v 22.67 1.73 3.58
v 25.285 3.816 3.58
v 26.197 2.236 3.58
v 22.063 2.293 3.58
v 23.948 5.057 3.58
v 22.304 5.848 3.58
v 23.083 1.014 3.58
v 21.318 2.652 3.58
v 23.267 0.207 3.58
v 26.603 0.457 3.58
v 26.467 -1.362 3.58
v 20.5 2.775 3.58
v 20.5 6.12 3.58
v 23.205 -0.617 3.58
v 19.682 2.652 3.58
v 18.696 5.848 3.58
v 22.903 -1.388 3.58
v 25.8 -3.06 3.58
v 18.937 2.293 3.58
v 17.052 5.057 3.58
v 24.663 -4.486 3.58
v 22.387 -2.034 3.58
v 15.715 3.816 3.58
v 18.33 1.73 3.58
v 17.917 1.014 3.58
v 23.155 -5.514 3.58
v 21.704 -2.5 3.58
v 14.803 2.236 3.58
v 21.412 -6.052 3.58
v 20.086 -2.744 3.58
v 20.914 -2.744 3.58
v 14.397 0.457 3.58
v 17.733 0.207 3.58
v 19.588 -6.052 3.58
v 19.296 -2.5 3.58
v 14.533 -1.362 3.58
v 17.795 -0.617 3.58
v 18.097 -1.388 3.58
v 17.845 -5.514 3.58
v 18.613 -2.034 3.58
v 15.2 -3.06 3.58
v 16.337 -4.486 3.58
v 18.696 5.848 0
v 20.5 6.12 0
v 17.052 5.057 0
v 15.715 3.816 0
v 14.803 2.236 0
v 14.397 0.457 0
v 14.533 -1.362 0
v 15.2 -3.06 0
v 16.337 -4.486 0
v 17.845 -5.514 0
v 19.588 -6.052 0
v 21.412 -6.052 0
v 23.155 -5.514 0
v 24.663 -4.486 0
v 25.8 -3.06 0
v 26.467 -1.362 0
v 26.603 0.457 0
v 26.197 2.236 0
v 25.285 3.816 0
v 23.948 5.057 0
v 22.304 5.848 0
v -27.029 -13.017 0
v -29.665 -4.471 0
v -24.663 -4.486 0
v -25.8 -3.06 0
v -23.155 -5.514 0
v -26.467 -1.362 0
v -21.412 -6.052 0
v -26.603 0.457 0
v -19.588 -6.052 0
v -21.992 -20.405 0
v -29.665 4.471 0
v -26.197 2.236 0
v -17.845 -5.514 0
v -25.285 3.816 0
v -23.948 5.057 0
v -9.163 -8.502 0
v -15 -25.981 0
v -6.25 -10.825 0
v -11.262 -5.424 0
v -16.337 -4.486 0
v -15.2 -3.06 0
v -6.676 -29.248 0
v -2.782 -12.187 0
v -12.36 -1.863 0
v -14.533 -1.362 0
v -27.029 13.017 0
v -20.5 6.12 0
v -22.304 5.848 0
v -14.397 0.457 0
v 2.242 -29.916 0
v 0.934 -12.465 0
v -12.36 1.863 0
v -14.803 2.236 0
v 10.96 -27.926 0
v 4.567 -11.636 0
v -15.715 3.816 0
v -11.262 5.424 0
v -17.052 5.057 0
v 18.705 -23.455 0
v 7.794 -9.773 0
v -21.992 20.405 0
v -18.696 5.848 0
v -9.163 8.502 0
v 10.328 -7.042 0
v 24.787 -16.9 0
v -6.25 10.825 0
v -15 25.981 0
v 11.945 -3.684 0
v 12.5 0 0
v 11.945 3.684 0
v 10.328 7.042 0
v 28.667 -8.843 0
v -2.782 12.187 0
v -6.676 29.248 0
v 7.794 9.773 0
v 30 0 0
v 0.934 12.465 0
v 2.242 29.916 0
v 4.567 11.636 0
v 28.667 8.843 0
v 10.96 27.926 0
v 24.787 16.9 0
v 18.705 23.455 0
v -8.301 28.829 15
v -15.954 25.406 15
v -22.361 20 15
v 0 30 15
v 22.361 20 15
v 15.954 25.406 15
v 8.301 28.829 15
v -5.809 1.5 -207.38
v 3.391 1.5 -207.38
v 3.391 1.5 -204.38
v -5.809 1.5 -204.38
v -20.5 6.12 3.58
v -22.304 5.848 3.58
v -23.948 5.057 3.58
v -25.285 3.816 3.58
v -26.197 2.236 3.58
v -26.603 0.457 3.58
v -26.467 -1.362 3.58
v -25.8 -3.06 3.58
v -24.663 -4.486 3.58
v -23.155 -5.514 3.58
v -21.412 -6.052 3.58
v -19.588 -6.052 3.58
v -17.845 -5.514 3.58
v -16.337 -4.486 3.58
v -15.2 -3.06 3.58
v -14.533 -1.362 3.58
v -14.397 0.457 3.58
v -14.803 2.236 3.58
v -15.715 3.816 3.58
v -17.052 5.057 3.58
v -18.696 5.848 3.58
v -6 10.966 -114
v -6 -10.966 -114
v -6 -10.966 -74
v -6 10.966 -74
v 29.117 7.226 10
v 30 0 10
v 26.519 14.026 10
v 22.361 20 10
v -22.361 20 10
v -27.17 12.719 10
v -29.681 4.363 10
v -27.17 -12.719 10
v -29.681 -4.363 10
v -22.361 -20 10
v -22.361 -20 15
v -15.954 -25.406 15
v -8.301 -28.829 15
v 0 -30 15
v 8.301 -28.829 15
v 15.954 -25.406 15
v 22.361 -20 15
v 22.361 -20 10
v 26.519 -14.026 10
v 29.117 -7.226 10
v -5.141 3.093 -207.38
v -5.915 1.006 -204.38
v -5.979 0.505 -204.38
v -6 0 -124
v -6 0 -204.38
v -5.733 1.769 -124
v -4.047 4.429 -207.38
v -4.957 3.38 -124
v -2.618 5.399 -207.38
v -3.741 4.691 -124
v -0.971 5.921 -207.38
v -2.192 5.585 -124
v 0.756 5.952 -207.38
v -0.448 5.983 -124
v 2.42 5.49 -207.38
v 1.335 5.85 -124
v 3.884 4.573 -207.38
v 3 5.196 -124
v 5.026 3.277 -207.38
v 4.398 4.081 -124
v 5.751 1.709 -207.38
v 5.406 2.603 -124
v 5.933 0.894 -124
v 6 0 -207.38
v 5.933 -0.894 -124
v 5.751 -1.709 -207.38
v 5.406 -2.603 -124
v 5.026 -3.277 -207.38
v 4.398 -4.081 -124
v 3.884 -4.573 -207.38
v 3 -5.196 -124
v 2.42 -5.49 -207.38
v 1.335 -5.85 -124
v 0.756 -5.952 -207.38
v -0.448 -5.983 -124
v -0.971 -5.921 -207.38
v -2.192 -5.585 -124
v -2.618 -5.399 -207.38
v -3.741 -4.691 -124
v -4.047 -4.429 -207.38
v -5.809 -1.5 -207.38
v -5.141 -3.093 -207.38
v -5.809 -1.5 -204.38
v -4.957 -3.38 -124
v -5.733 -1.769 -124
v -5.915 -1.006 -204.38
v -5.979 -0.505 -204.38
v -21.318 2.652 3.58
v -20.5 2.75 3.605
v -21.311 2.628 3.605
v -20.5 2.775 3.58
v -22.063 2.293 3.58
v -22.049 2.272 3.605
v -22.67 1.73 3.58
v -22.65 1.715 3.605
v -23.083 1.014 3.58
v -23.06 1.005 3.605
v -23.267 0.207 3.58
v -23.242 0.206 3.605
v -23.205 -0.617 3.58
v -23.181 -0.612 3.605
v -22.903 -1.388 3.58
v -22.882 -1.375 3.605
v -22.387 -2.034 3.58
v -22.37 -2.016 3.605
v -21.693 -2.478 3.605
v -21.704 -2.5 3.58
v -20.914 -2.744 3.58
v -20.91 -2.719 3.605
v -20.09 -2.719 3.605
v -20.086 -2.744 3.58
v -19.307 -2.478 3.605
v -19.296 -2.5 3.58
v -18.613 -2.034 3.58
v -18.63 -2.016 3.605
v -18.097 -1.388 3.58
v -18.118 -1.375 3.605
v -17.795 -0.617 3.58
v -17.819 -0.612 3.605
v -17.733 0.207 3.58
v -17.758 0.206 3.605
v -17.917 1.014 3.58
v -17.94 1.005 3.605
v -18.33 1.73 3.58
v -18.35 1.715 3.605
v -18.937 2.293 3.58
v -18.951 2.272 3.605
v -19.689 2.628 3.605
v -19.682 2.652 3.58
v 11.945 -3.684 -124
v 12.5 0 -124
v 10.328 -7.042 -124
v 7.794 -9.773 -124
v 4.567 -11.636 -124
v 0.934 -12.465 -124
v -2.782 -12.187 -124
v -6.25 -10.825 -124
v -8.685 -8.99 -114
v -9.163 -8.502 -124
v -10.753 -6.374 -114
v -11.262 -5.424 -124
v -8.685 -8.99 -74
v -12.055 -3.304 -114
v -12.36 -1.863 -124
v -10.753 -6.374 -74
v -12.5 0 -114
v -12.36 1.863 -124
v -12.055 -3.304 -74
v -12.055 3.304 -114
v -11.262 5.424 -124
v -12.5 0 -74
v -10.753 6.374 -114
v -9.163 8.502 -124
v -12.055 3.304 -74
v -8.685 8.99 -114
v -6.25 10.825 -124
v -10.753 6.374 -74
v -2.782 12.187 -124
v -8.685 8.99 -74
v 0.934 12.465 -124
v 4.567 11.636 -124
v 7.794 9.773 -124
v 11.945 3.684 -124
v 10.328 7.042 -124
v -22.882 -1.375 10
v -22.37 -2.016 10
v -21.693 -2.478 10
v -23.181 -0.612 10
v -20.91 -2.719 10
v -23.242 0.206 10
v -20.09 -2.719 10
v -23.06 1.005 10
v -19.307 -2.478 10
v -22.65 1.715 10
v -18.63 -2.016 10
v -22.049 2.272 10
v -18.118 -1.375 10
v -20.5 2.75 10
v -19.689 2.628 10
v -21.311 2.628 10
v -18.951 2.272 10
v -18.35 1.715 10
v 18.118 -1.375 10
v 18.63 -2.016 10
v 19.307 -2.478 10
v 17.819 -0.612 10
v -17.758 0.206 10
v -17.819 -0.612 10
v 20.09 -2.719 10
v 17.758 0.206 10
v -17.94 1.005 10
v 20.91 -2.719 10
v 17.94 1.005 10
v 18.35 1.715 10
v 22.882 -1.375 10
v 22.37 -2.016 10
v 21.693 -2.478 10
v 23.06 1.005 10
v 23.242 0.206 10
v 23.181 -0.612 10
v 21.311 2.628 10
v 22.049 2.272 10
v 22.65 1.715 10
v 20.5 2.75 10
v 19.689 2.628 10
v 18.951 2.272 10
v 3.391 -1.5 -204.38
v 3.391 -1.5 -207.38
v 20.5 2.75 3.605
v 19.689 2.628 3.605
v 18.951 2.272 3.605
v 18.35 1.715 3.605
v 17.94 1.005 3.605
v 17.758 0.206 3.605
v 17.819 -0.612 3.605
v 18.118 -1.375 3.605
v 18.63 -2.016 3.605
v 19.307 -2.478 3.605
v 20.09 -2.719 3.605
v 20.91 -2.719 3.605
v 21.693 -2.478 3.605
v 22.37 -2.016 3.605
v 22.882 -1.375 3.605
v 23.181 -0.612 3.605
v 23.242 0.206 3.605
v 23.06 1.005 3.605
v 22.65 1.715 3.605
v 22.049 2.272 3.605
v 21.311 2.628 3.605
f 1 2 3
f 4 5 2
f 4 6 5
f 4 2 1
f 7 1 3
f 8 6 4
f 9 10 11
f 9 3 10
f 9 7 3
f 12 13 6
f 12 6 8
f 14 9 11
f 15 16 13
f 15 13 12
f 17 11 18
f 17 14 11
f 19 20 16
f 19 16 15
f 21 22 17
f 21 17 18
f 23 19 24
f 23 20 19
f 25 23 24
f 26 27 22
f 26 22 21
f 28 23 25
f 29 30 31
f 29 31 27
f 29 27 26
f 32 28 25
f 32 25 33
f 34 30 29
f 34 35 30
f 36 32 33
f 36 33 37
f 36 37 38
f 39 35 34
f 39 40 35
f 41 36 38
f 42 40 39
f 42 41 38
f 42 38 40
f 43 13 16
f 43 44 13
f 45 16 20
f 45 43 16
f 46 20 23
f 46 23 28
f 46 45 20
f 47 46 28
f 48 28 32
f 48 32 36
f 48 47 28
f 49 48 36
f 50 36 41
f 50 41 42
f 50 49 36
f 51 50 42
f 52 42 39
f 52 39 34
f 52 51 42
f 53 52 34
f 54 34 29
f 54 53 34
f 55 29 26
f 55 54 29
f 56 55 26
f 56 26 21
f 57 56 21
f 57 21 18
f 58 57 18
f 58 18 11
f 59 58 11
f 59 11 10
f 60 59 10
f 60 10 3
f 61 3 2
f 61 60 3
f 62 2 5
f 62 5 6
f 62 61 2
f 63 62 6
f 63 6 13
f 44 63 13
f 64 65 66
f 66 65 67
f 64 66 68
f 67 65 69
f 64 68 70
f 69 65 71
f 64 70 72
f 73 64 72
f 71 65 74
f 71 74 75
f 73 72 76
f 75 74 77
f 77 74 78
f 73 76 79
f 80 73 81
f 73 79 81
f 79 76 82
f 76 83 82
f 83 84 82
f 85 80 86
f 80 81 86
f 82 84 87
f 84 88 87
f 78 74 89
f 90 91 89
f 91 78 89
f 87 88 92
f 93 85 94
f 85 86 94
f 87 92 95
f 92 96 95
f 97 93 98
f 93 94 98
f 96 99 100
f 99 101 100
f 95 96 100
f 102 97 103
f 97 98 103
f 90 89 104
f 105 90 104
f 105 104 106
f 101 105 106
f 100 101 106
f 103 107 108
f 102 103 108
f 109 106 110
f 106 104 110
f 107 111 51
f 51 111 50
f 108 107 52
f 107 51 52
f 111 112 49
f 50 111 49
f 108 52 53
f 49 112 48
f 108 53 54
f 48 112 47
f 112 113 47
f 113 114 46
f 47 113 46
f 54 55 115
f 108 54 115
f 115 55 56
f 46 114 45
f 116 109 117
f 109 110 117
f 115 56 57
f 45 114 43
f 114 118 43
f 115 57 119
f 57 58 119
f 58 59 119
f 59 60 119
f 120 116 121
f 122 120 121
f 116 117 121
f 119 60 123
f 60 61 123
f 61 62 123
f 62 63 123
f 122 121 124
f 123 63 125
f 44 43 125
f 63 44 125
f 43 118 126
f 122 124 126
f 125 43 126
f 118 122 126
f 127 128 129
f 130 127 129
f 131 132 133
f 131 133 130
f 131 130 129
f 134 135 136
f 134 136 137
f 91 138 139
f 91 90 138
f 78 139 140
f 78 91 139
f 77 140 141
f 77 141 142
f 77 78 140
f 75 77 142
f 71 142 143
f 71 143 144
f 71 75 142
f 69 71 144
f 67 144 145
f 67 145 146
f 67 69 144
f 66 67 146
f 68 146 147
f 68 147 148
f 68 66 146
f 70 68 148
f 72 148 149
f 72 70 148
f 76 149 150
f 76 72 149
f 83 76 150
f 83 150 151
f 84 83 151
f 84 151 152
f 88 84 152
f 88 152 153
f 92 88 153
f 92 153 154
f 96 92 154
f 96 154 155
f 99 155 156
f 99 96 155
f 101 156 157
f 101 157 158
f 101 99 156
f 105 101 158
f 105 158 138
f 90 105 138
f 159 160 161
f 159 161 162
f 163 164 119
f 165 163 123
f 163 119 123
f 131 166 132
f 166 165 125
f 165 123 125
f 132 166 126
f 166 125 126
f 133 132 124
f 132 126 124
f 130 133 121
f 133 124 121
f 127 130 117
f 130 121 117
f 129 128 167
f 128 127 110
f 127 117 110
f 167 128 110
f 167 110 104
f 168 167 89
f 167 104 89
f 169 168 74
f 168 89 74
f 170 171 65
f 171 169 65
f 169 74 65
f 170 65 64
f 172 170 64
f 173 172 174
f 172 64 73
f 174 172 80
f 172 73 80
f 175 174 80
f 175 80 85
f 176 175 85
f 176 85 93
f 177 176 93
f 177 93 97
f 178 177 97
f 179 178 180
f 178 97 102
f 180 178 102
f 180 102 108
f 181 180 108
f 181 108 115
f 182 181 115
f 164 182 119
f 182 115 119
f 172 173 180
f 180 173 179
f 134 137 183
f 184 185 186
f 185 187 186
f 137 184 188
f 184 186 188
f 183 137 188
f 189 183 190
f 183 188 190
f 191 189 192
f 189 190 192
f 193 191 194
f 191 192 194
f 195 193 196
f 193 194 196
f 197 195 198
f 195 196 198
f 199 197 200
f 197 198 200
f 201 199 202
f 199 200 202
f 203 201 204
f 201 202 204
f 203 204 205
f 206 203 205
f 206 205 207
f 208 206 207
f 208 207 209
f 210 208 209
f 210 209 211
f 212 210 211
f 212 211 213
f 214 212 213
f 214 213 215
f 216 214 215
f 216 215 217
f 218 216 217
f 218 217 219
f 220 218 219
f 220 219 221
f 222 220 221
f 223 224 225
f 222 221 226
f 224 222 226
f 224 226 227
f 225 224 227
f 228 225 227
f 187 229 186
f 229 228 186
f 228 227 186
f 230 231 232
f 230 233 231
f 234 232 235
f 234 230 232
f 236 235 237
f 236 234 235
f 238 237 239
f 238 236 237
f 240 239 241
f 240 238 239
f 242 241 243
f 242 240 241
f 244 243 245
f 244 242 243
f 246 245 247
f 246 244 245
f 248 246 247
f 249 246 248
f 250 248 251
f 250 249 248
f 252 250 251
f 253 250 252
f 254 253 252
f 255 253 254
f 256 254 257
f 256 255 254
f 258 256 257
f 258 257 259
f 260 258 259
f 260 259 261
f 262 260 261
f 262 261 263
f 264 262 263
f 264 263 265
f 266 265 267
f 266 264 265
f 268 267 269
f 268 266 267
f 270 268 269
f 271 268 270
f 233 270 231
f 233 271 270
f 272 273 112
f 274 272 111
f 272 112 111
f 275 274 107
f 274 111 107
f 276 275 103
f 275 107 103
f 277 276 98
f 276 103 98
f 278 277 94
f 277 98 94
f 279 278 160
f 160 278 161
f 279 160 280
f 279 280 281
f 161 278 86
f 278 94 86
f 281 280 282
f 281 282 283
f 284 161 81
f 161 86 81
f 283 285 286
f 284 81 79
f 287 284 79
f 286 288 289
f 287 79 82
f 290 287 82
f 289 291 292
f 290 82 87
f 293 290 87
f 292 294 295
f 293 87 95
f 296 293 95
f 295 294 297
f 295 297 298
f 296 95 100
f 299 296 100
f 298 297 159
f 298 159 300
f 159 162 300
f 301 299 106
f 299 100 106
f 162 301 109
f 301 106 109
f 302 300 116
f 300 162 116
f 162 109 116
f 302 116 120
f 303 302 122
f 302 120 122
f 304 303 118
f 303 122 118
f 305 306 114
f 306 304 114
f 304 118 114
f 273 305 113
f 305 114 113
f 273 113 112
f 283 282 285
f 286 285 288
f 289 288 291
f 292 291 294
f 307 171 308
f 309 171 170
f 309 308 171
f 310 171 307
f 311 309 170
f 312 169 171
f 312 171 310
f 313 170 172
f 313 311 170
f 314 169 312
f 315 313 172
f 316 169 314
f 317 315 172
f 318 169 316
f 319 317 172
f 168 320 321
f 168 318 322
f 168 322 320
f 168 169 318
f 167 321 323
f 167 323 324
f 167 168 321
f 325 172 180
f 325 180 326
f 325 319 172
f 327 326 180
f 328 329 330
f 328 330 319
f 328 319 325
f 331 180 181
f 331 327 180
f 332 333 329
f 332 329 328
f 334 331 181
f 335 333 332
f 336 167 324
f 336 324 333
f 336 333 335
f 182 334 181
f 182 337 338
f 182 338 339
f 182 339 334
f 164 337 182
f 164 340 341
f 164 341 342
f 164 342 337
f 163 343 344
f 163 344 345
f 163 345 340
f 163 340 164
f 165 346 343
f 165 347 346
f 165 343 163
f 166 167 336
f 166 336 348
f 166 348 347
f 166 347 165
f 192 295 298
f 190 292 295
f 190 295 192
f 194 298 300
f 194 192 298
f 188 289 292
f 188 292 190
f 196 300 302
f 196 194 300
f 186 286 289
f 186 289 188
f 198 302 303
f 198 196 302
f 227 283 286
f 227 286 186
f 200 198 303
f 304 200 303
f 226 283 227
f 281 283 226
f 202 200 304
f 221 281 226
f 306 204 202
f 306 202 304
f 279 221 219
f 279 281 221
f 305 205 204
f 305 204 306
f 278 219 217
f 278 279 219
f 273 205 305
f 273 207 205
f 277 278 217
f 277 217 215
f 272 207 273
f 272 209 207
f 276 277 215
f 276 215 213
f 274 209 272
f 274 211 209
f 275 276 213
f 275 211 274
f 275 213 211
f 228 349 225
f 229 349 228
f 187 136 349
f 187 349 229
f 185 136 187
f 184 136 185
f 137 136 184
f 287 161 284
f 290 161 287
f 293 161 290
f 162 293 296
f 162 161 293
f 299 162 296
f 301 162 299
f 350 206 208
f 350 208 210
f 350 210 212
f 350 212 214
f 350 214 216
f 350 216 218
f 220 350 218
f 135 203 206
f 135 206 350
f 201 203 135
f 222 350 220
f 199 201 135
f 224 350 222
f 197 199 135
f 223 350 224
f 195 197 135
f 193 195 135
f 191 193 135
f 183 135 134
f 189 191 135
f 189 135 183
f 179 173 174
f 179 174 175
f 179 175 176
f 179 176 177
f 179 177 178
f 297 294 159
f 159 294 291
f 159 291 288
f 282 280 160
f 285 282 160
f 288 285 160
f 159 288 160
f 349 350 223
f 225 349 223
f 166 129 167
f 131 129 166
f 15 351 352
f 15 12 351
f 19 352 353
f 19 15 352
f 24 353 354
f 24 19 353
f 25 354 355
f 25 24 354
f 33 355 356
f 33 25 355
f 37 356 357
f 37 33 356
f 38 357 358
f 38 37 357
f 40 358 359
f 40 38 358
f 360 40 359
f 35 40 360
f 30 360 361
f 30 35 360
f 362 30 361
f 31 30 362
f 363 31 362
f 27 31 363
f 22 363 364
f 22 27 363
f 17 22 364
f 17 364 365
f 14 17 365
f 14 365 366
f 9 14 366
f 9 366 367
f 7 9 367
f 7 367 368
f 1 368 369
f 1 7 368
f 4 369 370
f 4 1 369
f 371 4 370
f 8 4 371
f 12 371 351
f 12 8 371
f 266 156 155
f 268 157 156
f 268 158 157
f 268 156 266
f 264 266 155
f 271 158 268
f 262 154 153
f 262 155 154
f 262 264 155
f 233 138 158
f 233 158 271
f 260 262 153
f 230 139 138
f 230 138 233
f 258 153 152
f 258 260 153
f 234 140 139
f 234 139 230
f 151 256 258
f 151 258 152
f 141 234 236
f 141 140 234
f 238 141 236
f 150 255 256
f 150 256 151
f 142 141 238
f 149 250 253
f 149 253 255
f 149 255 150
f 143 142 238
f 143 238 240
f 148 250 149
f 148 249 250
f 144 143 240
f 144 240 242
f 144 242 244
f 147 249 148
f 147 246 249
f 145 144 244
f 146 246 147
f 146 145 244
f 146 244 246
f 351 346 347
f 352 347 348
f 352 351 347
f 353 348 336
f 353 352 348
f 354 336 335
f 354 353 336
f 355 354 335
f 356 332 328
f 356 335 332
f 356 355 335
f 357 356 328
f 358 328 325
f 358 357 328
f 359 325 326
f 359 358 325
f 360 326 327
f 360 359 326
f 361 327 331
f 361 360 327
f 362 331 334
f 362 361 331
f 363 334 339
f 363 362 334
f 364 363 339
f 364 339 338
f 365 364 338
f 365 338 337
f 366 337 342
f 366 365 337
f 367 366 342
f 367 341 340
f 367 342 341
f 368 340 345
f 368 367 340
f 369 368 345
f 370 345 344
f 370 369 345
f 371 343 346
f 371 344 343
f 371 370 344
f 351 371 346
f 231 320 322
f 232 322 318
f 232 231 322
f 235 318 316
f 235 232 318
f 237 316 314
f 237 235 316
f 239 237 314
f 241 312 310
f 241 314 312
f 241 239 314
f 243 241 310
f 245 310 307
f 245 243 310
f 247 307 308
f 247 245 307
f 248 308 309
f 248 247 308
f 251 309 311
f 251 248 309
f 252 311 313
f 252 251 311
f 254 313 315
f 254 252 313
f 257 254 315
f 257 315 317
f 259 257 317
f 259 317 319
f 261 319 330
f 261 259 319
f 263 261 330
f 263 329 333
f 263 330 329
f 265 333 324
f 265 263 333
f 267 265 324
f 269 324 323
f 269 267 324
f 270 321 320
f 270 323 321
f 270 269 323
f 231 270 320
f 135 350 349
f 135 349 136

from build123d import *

# Parameters (mm, degrees)
ESQUISSE1_R                                = 30
BOSS_EXTRU_1_DEPTH                         = 15
ESQUISSE2_R                                = 12.5
BOSS_EXTRU_2_DEPTH                         = 124
ESQUISSE4_2_W                              = 230
ESQUISSE4_2_H                              = 40
ENL_V_MAT_EXTRU_1_DEPTH                    = 5
CHAMBRAGE_POUR_VIS_T_TE_HEXAGONALE_2_COUNT = 2
CHAMBRAGE_POUR_VIS_T_TE_HEXAGONALE_2_PITCH = 41
ESQUISSE17_R                               = 6
BOSS_EXTRU_4_DEPTH                         = 83.38
ESQUISSE18_W                               = 10.356322474
ESQUISSE18_H                               = 3
ENL_V_MAT_EXTRU_2_DEPTH                    = 3
ESQUISSE19_W                               = 7.933443835
ESQUISSE19_H                               = 21.9317122
ENL_V_MAT_EXTRU_3_DEPTH                    = 50
BOSS_EXTRU_6_START                         = -10
ESQUISSE21_R                               = 12.5
BOSS_EXTRU_6_DEPTH                         = 10


with BuildPart() as part:
    # Esquisse1 → Boss.-Extru.1 (new body)
    with BuildSketch(Plane.XY):
        Circle(ESQUISSE1_R)
    extrude(amount=BOSS_EXTRU_1_DEPTH)

    # Esquisse2 → Boss.-Extru.2 (add)
    with BuildSketch(Plane(origin=(0, 0, 0), x_dir=(-1, 0, 0), z_dir=(0, 0, -1))):
        Circle(ESQUISSE2_R)
    extrude(amount=BOSS_EXTRU_2_DEPTH)

    # Esquisse4<2> → Enlèv. mat.-Extru.1 (cut)
    with BuildSketch(Plane.XY.offset(15)):
        Rectangle(ESQUISSE4_2_W, ESQUISSE4_2_H)
    extrude(amount=-ENL_V_MAT_EXTRU_1_DEPTH, mode=Mode.SUBTRACT)

    # Esquisse14 → Chambrage pour vis à tête hexagonale M51 (revolve, cut)
    with BuildSketch(Plane.YZ.offset(-20.5)):
        Polygon((0, 0), (0, 15), (2.75, 15), (2.75, 3.605), (2.775, 3.58), (6.12, 3.58), (6.12, 0), align=None)
    chambrage_pour_vis_t_te_hexagonale_m51 = revolve(axis=Axis((-20.5, 0, -6.35), (0, 0, 1)), mode=Mode.SUBTRACT)

    # Chambrage pour vis _ t_te hexagonale 2: Chambrage pour vis à tête hexagonale M51 ×2
    with Locations(*[(i * CHAMBRAGE_POUR_VIS_T_TE_HEXAGONALE_2_PITCH, 0, 0) for i in range(1, CHAMBRAGE_POUR_VIS_T_TE_HEXAGONALE_2_COUNT)]):
        add(chambrage_pour_vis_t_te_hexagonale_m51, mode=Mode.SUBTRACT)

    # Esquisse17 → Boss.-Extru.4 (add)
    with BuildSketch(Plane(origin=(0, 0, -124), x_dir=(-1, 0, 0), z_dir=(0, 0, -1))):
        Circle(ESQUISSE17_R)
    extrude(amount=BOSS_EXTRU_4_DEPTH)

    # Esquisse18 → Enlèv. mat.-Extru.2 (cut)
    with BuildSketch(Plane(origin=(0, 0, -207.38), x_dir=(-1, 0, 0), z_dir=(0, 0, -1))):
        with Locations((1.787207702, 0)):
            Rectangle(ESQUISSE18_W, ESQUISSE18_H)
    extrude(amount=-ENL_V_MAT_EXTRU_2_DEPTH, mode=Mode.SUBTRACT)

    # Esquisse19 → Enlèv. mat.-Extru.3 (cut)
    with BuildSketch(Plane(origin=(0, 0, -124), x_dir=(-1, 0, 0), z_dir=(0, 0, -1))):
        with Locations((9.966721917, 0)):
            Rectangle(ESQUISSE19_W, ESQUISSE19_H)
    extrude(amount=-ENL_V_MAT_EXTRU_3_DEPTH, mode=Mode.SUBTRACT)

    # Esquisse21 → Boss.-Extru.6 (add)
    with BuildSketch(Plane(origin=(0, 0, -124), x_dir=(-1, 0, 0), z_dir=(0, 0, -1)).offset(BOSS_EXTRU_6_START)):
        Circle(ESQUISSE21_R)
    extrude(amount=BOSS_EXTRU_6_DEPTH)


solid = part.part
